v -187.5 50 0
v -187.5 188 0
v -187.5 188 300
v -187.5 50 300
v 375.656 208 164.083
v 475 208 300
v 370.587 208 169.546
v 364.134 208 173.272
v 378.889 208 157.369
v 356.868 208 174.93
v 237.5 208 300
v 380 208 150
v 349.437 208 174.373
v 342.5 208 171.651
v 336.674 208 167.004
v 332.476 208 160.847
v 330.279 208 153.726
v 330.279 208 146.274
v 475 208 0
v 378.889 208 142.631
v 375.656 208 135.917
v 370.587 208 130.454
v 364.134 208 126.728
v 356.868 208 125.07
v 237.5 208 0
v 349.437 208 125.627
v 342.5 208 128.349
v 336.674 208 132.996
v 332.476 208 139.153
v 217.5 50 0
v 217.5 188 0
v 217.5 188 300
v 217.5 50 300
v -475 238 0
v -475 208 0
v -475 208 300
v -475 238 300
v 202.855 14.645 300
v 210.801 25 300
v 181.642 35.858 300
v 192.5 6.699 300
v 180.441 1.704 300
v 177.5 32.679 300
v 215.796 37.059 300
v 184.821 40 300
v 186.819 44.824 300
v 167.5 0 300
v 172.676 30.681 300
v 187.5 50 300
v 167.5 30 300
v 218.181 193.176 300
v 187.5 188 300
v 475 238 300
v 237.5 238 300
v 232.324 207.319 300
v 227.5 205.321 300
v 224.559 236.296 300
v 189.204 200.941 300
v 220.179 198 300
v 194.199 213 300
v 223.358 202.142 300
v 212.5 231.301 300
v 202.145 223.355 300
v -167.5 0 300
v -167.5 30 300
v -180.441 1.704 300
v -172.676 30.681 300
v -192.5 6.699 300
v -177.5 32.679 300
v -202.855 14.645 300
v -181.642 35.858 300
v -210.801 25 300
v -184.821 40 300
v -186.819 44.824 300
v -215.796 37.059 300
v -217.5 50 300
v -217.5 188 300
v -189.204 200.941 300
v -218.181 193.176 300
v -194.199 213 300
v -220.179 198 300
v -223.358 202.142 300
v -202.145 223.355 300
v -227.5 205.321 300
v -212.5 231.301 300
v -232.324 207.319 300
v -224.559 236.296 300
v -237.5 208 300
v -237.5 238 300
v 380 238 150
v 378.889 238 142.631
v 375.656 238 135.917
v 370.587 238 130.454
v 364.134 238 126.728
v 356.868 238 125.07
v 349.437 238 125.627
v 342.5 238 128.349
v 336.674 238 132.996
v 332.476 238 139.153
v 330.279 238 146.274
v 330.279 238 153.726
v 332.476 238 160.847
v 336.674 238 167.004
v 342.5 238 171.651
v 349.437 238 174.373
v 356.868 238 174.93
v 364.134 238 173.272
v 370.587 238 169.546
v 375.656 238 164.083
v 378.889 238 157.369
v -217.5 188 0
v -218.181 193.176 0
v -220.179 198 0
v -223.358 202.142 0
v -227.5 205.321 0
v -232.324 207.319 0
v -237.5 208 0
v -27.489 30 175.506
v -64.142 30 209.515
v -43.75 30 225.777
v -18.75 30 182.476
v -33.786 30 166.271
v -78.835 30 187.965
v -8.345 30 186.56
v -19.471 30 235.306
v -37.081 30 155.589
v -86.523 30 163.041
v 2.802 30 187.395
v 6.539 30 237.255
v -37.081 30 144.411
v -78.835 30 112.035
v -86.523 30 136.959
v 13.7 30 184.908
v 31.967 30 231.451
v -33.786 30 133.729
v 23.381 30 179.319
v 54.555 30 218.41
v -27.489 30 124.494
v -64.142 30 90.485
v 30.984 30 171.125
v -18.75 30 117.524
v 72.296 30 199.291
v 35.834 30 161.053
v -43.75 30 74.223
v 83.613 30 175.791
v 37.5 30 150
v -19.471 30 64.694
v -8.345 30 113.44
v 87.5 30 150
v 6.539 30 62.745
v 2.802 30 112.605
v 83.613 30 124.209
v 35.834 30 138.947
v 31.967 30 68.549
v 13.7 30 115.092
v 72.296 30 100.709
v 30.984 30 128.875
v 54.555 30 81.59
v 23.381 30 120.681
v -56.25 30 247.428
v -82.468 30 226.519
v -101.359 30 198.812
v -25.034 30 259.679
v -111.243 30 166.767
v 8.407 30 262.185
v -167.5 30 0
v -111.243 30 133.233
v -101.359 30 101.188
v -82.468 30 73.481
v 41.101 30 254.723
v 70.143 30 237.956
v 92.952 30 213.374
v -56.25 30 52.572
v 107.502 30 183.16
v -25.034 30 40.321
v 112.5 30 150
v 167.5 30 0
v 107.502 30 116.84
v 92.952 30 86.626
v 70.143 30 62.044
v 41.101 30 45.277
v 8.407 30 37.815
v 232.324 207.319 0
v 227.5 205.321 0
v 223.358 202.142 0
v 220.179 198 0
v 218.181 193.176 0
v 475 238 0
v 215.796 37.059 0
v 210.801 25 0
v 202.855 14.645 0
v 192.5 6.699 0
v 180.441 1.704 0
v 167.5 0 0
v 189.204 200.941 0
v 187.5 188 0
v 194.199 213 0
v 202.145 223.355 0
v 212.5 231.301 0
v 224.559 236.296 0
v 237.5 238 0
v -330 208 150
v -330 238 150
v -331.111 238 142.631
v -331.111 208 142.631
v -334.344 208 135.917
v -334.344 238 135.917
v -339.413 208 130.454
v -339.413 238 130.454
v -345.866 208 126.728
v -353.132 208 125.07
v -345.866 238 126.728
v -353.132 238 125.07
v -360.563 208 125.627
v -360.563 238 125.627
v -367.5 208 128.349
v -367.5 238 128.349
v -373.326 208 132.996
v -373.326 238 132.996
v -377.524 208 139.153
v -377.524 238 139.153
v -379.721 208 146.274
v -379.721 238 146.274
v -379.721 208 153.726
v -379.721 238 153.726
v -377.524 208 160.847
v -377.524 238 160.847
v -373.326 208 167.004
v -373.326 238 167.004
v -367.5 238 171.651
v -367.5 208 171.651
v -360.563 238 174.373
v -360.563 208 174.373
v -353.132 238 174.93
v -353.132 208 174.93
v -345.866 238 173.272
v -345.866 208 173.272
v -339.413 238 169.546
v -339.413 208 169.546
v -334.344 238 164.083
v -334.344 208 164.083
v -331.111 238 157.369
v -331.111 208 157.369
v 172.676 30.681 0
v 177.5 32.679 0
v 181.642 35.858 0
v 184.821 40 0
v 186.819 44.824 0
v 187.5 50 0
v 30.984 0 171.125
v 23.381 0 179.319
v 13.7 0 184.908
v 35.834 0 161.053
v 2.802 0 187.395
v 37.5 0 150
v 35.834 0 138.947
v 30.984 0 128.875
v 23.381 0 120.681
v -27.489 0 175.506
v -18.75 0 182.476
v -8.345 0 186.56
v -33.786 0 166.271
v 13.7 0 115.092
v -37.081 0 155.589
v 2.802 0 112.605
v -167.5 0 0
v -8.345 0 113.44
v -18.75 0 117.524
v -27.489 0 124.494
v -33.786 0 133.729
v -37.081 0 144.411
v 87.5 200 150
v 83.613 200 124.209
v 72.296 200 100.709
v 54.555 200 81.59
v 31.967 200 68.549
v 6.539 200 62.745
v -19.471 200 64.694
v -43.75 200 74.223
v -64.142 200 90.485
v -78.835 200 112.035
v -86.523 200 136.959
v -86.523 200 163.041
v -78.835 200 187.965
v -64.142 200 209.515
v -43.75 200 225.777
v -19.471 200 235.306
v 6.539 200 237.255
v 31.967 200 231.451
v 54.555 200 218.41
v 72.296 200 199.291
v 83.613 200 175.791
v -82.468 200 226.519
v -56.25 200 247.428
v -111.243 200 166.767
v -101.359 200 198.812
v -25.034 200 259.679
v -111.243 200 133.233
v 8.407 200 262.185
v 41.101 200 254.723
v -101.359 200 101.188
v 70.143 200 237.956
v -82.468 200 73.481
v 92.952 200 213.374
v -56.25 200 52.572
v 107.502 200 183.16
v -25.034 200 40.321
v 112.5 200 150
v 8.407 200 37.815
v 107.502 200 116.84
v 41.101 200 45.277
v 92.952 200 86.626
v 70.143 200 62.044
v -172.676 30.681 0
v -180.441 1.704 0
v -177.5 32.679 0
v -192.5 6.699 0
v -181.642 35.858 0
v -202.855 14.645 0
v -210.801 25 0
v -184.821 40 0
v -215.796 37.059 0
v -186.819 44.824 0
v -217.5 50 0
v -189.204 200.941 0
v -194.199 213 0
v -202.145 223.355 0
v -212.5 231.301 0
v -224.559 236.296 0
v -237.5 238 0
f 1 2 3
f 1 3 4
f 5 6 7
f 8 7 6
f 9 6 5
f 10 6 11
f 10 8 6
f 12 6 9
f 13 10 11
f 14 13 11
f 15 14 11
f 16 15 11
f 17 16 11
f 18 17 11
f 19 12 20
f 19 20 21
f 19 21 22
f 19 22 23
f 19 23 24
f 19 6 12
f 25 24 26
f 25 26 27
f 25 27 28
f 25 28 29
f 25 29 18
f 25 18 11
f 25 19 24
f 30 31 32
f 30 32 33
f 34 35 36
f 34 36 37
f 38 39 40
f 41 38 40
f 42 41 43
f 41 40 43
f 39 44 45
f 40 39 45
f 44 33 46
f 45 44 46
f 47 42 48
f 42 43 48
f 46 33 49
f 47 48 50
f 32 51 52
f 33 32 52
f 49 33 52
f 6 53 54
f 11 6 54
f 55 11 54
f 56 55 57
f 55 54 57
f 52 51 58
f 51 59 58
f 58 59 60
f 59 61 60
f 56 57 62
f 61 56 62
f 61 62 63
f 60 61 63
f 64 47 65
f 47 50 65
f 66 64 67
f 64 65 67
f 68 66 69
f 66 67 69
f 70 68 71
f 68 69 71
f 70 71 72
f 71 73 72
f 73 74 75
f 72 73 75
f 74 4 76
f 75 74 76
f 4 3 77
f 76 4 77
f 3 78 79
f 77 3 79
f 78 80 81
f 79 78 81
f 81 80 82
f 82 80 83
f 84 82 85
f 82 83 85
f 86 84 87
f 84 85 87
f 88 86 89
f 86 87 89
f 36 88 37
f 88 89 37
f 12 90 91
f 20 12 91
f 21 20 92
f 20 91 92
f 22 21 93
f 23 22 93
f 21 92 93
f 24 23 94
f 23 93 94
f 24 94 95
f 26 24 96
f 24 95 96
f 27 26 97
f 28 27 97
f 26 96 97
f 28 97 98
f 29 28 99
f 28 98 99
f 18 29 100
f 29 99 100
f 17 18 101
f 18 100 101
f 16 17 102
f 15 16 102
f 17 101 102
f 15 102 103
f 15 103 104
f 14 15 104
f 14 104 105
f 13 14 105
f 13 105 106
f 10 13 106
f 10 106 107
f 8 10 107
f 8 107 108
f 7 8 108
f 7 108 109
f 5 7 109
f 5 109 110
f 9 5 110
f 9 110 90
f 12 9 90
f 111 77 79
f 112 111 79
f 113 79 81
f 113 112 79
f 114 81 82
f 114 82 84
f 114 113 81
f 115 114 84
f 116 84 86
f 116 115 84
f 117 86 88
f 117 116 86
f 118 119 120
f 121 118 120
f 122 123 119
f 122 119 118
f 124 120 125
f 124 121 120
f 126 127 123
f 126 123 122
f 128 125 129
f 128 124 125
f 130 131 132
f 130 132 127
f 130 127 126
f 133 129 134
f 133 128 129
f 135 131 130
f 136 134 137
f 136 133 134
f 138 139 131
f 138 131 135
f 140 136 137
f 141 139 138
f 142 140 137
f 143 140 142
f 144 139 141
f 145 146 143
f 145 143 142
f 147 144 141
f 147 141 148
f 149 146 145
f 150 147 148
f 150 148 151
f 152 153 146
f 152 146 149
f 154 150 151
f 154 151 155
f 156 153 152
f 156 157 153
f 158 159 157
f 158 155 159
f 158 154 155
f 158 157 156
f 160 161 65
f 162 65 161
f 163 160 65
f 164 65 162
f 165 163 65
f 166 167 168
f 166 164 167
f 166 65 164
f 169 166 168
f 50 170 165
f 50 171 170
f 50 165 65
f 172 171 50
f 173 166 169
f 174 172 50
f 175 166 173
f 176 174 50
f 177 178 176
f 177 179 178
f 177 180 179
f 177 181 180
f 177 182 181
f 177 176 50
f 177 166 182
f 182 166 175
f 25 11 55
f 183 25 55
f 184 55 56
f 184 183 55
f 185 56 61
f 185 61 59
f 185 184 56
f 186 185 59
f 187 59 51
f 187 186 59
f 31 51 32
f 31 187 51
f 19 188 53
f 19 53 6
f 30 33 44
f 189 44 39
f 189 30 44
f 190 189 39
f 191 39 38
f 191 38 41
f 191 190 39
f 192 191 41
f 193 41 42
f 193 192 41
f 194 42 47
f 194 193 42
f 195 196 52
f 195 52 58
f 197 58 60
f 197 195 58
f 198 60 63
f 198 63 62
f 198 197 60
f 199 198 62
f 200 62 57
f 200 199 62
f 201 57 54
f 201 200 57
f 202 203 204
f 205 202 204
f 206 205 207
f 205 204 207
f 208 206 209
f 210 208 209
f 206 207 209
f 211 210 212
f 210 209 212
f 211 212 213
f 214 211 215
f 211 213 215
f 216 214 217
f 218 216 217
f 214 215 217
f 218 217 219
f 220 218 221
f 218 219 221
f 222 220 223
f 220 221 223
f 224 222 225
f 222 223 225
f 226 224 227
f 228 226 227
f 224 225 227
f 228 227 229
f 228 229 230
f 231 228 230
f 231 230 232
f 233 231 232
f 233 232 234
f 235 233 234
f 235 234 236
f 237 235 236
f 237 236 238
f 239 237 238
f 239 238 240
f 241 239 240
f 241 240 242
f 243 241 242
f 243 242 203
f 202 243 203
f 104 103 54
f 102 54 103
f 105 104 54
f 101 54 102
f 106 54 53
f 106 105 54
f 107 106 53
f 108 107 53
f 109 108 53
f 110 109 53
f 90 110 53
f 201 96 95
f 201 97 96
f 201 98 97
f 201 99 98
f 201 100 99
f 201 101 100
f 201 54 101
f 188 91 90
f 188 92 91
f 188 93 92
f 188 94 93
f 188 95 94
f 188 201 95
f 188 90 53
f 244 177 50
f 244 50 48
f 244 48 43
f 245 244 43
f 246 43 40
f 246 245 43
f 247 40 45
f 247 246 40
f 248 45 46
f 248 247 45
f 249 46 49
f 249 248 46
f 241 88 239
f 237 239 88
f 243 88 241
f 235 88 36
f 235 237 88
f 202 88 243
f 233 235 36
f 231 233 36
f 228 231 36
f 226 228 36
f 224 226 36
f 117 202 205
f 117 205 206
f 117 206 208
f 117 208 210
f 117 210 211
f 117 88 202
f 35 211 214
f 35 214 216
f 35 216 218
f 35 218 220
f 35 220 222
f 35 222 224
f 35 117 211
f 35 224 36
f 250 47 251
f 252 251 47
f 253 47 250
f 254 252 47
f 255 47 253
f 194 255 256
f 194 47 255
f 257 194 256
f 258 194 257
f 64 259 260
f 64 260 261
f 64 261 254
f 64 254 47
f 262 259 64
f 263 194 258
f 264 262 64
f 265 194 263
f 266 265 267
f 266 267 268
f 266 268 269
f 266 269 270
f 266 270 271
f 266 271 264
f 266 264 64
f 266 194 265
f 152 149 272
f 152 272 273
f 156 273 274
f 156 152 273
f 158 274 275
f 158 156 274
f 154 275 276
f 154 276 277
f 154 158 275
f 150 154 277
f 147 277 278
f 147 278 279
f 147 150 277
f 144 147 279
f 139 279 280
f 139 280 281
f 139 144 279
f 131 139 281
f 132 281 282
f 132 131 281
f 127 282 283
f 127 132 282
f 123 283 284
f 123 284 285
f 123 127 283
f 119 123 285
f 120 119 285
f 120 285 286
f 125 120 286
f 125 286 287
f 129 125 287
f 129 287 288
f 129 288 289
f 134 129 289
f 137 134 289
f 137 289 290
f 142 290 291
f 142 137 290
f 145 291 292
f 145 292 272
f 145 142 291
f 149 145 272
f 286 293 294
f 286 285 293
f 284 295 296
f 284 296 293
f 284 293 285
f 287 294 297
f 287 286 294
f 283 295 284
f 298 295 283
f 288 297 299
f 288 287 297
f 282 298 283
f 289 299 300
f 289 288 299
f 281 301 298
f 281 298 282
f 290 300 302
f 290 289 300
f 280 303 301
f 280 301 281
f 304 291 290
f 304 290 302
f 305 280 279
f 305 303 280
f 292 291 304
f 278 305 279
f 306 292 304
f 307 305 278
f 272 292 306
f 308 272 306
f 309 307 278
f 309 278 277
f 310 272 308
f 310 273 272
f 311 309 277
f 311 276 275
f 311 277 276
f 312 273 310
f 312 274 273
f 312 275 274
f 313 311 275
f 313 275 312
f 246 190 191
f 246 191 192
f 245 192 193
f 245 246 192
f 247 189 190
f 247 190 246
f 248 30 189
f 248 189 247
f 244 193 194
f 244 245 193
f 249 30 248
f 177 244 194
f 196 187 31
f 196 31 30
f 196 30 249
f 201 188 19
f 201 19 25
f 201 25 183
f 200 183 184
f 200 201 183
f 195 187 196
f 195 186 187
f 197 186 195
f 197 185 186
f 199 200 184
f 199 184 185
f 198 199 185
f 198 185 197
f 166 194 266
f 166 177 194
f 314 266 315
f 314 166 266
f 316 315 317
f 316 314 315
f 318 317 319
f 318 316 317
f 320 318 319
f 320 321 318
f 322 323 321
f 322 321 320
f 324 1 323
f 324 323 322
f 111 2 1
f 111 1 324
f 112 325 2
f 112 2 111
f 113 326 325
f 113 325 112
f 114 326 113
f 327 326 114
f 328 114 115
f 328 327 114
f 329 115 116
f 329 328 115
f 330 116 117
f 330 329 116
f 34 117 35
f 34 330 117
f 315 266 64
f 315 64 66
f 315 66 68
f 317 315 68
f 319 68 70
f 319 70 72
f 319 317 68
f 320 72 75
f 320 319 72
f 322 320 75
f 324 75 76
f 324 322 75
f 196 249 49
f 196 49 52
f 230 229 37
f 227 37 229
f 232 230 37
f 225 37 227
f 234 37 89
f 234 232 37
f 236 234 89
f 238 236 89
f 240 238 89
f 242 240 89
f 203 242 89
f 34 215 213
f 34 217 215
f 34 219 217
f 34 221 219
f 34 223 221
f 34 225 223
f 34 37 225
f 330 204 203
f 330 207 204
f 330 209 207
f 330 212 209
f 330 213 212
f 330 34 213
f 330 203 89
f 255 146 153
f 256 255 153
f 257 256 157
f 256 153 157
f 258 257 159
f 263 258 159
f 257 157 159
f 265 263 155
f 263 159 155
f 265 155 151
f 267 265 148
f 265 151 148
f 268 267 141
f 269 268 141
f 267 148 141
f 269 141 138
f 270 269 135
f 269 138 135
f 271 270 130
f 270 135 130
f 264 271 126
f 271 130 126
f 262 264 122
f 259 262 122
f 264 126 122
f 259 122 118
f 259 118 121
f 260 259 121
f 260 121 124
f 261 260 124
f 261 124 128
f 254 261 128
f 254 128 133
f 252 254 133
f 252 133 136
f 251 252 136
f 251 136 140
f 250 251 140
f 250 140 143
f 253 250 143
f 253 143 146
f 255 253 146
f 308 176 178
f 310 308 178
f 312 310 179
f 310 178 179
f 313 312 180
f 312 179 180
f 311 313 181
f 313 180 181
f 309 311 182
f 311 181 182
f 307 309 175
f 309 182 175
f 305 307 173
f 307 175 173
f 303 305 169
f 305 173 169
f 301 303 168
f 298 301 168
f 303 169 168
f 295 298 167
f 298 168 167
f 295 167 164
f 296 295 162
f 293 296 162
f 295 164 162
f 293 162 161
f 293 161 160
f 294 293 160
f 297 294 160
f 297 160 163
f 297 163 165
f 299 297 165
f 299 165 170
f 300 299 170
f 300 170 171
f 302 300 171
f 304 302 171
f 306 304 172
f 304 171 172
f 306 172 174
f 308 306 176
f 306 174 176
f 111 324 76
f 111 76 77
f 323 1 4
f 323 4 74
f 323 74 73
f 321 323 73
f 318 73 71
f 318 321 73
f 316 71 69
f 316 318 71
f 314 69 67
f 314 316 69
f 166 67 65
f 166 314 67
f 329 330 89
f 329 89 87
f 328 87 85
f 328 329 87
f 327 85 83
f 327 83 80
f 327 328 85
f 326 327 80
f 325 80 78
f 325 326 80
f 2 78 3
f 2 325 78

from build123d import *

# Parameters (mm, degrees)
BOSS_EXTRUDE1_DEPTH = 300
SKETCH3_R           = 112.5
SKETCH3_R_2         = 87.5
BOSS_EXTRUDE2_DEPTH = 170
SKETCH4_R           = 37.5
CUT_EXTRUDE1_DEPTH  = 170
SKETCH5_R           = 25
CUT_EXTRUDE2_DEPTH  = 170


with BuildPart() as part:
    # Sketch1 → Boss-Extrude1 (new body)
    with BuildSketch(Plane.XY):
        with BuildLine():
            Line((167.5, 0), (-167.5, 0))
            ThreePointArc((-167.5, 0), (-202.855339059, 14.644660941), (-217.5, 50))
            Line((-217.5, 50), (-217.5, 188))
            ThreePointArc((-217.5, 188), (-223.357864376, 202.142135624), (-237.5, 208))
            Line((-237.5, 208), (-475, 208))
            Line((-475, 208), (-475, 238))
            Line((-475, 238), (-237.5, 238))
            ThreePointArc((-237.5, 238), (-202.144660941, 223.355339059), (-187.5, 188))
            Line((-187.5, 188), (-187.5, 50))
            ThreePointArc((-187.5, 50), (-181.642135624, 35.857864376), (-167.5, 30))
            Line((-167.5, 30), (167.5, 30))
            ThreePointArc((167.5, 30), (181.642135624, 35.857864376), (187.5, 50))
            Line((187.5, 50), (187.5, 188))
            ThreePointArc((187.5, 188), (202.144660941, 223.355339059), (237.5, 238))
            Line((237.5, 238), (475, 238))
            Line((475, 238), (475, 208))
            Line((475, 208), (237.5, 208))
            ThreePointArc((237.5, 208), (223.357864376, 202.142135624), (217.5, 188))
            Line((217.5, 188), (217.5, 50))
            ThreePointArc((217.5, 50), (202.855339059, 14.644660941), (167.5, 0))
        make_face()
    extrude(amount=BOSS_EXTRUDE1_DEPTH)

    # Sketch3 → Boss-Extrude2 (add)
    with BuildSketch(Plane(origin=(0, 30, 0), x_dir=(1, 0, 0), z_dir=(0, 1, 0))):
        with Locations((0, -150)):
            Circle(SKETCH3_R)
        with Locations((0, -150)):
            Circle(SKETCH3_R_2, mode=Mode.SUBTRACT)
    extrude(amount=BOSS_EXTRUDE2_DEPTH)

    # Sketch4 → Cut-Extrude1 (cut)
    with BuildSketch(Plane(origin=(0, 30, 0), x_dir=(1, 0, 0), z_dir=(0, 1, 0))):
        with Locations((0, -150)):
            Circle(SKETCH4_R)
    extrude(amount=-CUT_EXTRUDE1_DEPTH, mode=Mode.SUBTRACT)

    # Sketch5 → Cut-Extrude2 (cut)
    with BuildSketch(Plane(origin=(0, 238, 0), x_dir=(1, 0, 0), z_dir=(0, 1, 0))):
        with Locations((355, -150)):
            Circle(SKETCH5_R)
        with Locations((-355, -150)):
            Circle(SKETCH5_R)
    extrude(amount=-CUT_EXTRUDE2_DEPTH, mode=Mode.SUBTRACT)


solid = part.part
